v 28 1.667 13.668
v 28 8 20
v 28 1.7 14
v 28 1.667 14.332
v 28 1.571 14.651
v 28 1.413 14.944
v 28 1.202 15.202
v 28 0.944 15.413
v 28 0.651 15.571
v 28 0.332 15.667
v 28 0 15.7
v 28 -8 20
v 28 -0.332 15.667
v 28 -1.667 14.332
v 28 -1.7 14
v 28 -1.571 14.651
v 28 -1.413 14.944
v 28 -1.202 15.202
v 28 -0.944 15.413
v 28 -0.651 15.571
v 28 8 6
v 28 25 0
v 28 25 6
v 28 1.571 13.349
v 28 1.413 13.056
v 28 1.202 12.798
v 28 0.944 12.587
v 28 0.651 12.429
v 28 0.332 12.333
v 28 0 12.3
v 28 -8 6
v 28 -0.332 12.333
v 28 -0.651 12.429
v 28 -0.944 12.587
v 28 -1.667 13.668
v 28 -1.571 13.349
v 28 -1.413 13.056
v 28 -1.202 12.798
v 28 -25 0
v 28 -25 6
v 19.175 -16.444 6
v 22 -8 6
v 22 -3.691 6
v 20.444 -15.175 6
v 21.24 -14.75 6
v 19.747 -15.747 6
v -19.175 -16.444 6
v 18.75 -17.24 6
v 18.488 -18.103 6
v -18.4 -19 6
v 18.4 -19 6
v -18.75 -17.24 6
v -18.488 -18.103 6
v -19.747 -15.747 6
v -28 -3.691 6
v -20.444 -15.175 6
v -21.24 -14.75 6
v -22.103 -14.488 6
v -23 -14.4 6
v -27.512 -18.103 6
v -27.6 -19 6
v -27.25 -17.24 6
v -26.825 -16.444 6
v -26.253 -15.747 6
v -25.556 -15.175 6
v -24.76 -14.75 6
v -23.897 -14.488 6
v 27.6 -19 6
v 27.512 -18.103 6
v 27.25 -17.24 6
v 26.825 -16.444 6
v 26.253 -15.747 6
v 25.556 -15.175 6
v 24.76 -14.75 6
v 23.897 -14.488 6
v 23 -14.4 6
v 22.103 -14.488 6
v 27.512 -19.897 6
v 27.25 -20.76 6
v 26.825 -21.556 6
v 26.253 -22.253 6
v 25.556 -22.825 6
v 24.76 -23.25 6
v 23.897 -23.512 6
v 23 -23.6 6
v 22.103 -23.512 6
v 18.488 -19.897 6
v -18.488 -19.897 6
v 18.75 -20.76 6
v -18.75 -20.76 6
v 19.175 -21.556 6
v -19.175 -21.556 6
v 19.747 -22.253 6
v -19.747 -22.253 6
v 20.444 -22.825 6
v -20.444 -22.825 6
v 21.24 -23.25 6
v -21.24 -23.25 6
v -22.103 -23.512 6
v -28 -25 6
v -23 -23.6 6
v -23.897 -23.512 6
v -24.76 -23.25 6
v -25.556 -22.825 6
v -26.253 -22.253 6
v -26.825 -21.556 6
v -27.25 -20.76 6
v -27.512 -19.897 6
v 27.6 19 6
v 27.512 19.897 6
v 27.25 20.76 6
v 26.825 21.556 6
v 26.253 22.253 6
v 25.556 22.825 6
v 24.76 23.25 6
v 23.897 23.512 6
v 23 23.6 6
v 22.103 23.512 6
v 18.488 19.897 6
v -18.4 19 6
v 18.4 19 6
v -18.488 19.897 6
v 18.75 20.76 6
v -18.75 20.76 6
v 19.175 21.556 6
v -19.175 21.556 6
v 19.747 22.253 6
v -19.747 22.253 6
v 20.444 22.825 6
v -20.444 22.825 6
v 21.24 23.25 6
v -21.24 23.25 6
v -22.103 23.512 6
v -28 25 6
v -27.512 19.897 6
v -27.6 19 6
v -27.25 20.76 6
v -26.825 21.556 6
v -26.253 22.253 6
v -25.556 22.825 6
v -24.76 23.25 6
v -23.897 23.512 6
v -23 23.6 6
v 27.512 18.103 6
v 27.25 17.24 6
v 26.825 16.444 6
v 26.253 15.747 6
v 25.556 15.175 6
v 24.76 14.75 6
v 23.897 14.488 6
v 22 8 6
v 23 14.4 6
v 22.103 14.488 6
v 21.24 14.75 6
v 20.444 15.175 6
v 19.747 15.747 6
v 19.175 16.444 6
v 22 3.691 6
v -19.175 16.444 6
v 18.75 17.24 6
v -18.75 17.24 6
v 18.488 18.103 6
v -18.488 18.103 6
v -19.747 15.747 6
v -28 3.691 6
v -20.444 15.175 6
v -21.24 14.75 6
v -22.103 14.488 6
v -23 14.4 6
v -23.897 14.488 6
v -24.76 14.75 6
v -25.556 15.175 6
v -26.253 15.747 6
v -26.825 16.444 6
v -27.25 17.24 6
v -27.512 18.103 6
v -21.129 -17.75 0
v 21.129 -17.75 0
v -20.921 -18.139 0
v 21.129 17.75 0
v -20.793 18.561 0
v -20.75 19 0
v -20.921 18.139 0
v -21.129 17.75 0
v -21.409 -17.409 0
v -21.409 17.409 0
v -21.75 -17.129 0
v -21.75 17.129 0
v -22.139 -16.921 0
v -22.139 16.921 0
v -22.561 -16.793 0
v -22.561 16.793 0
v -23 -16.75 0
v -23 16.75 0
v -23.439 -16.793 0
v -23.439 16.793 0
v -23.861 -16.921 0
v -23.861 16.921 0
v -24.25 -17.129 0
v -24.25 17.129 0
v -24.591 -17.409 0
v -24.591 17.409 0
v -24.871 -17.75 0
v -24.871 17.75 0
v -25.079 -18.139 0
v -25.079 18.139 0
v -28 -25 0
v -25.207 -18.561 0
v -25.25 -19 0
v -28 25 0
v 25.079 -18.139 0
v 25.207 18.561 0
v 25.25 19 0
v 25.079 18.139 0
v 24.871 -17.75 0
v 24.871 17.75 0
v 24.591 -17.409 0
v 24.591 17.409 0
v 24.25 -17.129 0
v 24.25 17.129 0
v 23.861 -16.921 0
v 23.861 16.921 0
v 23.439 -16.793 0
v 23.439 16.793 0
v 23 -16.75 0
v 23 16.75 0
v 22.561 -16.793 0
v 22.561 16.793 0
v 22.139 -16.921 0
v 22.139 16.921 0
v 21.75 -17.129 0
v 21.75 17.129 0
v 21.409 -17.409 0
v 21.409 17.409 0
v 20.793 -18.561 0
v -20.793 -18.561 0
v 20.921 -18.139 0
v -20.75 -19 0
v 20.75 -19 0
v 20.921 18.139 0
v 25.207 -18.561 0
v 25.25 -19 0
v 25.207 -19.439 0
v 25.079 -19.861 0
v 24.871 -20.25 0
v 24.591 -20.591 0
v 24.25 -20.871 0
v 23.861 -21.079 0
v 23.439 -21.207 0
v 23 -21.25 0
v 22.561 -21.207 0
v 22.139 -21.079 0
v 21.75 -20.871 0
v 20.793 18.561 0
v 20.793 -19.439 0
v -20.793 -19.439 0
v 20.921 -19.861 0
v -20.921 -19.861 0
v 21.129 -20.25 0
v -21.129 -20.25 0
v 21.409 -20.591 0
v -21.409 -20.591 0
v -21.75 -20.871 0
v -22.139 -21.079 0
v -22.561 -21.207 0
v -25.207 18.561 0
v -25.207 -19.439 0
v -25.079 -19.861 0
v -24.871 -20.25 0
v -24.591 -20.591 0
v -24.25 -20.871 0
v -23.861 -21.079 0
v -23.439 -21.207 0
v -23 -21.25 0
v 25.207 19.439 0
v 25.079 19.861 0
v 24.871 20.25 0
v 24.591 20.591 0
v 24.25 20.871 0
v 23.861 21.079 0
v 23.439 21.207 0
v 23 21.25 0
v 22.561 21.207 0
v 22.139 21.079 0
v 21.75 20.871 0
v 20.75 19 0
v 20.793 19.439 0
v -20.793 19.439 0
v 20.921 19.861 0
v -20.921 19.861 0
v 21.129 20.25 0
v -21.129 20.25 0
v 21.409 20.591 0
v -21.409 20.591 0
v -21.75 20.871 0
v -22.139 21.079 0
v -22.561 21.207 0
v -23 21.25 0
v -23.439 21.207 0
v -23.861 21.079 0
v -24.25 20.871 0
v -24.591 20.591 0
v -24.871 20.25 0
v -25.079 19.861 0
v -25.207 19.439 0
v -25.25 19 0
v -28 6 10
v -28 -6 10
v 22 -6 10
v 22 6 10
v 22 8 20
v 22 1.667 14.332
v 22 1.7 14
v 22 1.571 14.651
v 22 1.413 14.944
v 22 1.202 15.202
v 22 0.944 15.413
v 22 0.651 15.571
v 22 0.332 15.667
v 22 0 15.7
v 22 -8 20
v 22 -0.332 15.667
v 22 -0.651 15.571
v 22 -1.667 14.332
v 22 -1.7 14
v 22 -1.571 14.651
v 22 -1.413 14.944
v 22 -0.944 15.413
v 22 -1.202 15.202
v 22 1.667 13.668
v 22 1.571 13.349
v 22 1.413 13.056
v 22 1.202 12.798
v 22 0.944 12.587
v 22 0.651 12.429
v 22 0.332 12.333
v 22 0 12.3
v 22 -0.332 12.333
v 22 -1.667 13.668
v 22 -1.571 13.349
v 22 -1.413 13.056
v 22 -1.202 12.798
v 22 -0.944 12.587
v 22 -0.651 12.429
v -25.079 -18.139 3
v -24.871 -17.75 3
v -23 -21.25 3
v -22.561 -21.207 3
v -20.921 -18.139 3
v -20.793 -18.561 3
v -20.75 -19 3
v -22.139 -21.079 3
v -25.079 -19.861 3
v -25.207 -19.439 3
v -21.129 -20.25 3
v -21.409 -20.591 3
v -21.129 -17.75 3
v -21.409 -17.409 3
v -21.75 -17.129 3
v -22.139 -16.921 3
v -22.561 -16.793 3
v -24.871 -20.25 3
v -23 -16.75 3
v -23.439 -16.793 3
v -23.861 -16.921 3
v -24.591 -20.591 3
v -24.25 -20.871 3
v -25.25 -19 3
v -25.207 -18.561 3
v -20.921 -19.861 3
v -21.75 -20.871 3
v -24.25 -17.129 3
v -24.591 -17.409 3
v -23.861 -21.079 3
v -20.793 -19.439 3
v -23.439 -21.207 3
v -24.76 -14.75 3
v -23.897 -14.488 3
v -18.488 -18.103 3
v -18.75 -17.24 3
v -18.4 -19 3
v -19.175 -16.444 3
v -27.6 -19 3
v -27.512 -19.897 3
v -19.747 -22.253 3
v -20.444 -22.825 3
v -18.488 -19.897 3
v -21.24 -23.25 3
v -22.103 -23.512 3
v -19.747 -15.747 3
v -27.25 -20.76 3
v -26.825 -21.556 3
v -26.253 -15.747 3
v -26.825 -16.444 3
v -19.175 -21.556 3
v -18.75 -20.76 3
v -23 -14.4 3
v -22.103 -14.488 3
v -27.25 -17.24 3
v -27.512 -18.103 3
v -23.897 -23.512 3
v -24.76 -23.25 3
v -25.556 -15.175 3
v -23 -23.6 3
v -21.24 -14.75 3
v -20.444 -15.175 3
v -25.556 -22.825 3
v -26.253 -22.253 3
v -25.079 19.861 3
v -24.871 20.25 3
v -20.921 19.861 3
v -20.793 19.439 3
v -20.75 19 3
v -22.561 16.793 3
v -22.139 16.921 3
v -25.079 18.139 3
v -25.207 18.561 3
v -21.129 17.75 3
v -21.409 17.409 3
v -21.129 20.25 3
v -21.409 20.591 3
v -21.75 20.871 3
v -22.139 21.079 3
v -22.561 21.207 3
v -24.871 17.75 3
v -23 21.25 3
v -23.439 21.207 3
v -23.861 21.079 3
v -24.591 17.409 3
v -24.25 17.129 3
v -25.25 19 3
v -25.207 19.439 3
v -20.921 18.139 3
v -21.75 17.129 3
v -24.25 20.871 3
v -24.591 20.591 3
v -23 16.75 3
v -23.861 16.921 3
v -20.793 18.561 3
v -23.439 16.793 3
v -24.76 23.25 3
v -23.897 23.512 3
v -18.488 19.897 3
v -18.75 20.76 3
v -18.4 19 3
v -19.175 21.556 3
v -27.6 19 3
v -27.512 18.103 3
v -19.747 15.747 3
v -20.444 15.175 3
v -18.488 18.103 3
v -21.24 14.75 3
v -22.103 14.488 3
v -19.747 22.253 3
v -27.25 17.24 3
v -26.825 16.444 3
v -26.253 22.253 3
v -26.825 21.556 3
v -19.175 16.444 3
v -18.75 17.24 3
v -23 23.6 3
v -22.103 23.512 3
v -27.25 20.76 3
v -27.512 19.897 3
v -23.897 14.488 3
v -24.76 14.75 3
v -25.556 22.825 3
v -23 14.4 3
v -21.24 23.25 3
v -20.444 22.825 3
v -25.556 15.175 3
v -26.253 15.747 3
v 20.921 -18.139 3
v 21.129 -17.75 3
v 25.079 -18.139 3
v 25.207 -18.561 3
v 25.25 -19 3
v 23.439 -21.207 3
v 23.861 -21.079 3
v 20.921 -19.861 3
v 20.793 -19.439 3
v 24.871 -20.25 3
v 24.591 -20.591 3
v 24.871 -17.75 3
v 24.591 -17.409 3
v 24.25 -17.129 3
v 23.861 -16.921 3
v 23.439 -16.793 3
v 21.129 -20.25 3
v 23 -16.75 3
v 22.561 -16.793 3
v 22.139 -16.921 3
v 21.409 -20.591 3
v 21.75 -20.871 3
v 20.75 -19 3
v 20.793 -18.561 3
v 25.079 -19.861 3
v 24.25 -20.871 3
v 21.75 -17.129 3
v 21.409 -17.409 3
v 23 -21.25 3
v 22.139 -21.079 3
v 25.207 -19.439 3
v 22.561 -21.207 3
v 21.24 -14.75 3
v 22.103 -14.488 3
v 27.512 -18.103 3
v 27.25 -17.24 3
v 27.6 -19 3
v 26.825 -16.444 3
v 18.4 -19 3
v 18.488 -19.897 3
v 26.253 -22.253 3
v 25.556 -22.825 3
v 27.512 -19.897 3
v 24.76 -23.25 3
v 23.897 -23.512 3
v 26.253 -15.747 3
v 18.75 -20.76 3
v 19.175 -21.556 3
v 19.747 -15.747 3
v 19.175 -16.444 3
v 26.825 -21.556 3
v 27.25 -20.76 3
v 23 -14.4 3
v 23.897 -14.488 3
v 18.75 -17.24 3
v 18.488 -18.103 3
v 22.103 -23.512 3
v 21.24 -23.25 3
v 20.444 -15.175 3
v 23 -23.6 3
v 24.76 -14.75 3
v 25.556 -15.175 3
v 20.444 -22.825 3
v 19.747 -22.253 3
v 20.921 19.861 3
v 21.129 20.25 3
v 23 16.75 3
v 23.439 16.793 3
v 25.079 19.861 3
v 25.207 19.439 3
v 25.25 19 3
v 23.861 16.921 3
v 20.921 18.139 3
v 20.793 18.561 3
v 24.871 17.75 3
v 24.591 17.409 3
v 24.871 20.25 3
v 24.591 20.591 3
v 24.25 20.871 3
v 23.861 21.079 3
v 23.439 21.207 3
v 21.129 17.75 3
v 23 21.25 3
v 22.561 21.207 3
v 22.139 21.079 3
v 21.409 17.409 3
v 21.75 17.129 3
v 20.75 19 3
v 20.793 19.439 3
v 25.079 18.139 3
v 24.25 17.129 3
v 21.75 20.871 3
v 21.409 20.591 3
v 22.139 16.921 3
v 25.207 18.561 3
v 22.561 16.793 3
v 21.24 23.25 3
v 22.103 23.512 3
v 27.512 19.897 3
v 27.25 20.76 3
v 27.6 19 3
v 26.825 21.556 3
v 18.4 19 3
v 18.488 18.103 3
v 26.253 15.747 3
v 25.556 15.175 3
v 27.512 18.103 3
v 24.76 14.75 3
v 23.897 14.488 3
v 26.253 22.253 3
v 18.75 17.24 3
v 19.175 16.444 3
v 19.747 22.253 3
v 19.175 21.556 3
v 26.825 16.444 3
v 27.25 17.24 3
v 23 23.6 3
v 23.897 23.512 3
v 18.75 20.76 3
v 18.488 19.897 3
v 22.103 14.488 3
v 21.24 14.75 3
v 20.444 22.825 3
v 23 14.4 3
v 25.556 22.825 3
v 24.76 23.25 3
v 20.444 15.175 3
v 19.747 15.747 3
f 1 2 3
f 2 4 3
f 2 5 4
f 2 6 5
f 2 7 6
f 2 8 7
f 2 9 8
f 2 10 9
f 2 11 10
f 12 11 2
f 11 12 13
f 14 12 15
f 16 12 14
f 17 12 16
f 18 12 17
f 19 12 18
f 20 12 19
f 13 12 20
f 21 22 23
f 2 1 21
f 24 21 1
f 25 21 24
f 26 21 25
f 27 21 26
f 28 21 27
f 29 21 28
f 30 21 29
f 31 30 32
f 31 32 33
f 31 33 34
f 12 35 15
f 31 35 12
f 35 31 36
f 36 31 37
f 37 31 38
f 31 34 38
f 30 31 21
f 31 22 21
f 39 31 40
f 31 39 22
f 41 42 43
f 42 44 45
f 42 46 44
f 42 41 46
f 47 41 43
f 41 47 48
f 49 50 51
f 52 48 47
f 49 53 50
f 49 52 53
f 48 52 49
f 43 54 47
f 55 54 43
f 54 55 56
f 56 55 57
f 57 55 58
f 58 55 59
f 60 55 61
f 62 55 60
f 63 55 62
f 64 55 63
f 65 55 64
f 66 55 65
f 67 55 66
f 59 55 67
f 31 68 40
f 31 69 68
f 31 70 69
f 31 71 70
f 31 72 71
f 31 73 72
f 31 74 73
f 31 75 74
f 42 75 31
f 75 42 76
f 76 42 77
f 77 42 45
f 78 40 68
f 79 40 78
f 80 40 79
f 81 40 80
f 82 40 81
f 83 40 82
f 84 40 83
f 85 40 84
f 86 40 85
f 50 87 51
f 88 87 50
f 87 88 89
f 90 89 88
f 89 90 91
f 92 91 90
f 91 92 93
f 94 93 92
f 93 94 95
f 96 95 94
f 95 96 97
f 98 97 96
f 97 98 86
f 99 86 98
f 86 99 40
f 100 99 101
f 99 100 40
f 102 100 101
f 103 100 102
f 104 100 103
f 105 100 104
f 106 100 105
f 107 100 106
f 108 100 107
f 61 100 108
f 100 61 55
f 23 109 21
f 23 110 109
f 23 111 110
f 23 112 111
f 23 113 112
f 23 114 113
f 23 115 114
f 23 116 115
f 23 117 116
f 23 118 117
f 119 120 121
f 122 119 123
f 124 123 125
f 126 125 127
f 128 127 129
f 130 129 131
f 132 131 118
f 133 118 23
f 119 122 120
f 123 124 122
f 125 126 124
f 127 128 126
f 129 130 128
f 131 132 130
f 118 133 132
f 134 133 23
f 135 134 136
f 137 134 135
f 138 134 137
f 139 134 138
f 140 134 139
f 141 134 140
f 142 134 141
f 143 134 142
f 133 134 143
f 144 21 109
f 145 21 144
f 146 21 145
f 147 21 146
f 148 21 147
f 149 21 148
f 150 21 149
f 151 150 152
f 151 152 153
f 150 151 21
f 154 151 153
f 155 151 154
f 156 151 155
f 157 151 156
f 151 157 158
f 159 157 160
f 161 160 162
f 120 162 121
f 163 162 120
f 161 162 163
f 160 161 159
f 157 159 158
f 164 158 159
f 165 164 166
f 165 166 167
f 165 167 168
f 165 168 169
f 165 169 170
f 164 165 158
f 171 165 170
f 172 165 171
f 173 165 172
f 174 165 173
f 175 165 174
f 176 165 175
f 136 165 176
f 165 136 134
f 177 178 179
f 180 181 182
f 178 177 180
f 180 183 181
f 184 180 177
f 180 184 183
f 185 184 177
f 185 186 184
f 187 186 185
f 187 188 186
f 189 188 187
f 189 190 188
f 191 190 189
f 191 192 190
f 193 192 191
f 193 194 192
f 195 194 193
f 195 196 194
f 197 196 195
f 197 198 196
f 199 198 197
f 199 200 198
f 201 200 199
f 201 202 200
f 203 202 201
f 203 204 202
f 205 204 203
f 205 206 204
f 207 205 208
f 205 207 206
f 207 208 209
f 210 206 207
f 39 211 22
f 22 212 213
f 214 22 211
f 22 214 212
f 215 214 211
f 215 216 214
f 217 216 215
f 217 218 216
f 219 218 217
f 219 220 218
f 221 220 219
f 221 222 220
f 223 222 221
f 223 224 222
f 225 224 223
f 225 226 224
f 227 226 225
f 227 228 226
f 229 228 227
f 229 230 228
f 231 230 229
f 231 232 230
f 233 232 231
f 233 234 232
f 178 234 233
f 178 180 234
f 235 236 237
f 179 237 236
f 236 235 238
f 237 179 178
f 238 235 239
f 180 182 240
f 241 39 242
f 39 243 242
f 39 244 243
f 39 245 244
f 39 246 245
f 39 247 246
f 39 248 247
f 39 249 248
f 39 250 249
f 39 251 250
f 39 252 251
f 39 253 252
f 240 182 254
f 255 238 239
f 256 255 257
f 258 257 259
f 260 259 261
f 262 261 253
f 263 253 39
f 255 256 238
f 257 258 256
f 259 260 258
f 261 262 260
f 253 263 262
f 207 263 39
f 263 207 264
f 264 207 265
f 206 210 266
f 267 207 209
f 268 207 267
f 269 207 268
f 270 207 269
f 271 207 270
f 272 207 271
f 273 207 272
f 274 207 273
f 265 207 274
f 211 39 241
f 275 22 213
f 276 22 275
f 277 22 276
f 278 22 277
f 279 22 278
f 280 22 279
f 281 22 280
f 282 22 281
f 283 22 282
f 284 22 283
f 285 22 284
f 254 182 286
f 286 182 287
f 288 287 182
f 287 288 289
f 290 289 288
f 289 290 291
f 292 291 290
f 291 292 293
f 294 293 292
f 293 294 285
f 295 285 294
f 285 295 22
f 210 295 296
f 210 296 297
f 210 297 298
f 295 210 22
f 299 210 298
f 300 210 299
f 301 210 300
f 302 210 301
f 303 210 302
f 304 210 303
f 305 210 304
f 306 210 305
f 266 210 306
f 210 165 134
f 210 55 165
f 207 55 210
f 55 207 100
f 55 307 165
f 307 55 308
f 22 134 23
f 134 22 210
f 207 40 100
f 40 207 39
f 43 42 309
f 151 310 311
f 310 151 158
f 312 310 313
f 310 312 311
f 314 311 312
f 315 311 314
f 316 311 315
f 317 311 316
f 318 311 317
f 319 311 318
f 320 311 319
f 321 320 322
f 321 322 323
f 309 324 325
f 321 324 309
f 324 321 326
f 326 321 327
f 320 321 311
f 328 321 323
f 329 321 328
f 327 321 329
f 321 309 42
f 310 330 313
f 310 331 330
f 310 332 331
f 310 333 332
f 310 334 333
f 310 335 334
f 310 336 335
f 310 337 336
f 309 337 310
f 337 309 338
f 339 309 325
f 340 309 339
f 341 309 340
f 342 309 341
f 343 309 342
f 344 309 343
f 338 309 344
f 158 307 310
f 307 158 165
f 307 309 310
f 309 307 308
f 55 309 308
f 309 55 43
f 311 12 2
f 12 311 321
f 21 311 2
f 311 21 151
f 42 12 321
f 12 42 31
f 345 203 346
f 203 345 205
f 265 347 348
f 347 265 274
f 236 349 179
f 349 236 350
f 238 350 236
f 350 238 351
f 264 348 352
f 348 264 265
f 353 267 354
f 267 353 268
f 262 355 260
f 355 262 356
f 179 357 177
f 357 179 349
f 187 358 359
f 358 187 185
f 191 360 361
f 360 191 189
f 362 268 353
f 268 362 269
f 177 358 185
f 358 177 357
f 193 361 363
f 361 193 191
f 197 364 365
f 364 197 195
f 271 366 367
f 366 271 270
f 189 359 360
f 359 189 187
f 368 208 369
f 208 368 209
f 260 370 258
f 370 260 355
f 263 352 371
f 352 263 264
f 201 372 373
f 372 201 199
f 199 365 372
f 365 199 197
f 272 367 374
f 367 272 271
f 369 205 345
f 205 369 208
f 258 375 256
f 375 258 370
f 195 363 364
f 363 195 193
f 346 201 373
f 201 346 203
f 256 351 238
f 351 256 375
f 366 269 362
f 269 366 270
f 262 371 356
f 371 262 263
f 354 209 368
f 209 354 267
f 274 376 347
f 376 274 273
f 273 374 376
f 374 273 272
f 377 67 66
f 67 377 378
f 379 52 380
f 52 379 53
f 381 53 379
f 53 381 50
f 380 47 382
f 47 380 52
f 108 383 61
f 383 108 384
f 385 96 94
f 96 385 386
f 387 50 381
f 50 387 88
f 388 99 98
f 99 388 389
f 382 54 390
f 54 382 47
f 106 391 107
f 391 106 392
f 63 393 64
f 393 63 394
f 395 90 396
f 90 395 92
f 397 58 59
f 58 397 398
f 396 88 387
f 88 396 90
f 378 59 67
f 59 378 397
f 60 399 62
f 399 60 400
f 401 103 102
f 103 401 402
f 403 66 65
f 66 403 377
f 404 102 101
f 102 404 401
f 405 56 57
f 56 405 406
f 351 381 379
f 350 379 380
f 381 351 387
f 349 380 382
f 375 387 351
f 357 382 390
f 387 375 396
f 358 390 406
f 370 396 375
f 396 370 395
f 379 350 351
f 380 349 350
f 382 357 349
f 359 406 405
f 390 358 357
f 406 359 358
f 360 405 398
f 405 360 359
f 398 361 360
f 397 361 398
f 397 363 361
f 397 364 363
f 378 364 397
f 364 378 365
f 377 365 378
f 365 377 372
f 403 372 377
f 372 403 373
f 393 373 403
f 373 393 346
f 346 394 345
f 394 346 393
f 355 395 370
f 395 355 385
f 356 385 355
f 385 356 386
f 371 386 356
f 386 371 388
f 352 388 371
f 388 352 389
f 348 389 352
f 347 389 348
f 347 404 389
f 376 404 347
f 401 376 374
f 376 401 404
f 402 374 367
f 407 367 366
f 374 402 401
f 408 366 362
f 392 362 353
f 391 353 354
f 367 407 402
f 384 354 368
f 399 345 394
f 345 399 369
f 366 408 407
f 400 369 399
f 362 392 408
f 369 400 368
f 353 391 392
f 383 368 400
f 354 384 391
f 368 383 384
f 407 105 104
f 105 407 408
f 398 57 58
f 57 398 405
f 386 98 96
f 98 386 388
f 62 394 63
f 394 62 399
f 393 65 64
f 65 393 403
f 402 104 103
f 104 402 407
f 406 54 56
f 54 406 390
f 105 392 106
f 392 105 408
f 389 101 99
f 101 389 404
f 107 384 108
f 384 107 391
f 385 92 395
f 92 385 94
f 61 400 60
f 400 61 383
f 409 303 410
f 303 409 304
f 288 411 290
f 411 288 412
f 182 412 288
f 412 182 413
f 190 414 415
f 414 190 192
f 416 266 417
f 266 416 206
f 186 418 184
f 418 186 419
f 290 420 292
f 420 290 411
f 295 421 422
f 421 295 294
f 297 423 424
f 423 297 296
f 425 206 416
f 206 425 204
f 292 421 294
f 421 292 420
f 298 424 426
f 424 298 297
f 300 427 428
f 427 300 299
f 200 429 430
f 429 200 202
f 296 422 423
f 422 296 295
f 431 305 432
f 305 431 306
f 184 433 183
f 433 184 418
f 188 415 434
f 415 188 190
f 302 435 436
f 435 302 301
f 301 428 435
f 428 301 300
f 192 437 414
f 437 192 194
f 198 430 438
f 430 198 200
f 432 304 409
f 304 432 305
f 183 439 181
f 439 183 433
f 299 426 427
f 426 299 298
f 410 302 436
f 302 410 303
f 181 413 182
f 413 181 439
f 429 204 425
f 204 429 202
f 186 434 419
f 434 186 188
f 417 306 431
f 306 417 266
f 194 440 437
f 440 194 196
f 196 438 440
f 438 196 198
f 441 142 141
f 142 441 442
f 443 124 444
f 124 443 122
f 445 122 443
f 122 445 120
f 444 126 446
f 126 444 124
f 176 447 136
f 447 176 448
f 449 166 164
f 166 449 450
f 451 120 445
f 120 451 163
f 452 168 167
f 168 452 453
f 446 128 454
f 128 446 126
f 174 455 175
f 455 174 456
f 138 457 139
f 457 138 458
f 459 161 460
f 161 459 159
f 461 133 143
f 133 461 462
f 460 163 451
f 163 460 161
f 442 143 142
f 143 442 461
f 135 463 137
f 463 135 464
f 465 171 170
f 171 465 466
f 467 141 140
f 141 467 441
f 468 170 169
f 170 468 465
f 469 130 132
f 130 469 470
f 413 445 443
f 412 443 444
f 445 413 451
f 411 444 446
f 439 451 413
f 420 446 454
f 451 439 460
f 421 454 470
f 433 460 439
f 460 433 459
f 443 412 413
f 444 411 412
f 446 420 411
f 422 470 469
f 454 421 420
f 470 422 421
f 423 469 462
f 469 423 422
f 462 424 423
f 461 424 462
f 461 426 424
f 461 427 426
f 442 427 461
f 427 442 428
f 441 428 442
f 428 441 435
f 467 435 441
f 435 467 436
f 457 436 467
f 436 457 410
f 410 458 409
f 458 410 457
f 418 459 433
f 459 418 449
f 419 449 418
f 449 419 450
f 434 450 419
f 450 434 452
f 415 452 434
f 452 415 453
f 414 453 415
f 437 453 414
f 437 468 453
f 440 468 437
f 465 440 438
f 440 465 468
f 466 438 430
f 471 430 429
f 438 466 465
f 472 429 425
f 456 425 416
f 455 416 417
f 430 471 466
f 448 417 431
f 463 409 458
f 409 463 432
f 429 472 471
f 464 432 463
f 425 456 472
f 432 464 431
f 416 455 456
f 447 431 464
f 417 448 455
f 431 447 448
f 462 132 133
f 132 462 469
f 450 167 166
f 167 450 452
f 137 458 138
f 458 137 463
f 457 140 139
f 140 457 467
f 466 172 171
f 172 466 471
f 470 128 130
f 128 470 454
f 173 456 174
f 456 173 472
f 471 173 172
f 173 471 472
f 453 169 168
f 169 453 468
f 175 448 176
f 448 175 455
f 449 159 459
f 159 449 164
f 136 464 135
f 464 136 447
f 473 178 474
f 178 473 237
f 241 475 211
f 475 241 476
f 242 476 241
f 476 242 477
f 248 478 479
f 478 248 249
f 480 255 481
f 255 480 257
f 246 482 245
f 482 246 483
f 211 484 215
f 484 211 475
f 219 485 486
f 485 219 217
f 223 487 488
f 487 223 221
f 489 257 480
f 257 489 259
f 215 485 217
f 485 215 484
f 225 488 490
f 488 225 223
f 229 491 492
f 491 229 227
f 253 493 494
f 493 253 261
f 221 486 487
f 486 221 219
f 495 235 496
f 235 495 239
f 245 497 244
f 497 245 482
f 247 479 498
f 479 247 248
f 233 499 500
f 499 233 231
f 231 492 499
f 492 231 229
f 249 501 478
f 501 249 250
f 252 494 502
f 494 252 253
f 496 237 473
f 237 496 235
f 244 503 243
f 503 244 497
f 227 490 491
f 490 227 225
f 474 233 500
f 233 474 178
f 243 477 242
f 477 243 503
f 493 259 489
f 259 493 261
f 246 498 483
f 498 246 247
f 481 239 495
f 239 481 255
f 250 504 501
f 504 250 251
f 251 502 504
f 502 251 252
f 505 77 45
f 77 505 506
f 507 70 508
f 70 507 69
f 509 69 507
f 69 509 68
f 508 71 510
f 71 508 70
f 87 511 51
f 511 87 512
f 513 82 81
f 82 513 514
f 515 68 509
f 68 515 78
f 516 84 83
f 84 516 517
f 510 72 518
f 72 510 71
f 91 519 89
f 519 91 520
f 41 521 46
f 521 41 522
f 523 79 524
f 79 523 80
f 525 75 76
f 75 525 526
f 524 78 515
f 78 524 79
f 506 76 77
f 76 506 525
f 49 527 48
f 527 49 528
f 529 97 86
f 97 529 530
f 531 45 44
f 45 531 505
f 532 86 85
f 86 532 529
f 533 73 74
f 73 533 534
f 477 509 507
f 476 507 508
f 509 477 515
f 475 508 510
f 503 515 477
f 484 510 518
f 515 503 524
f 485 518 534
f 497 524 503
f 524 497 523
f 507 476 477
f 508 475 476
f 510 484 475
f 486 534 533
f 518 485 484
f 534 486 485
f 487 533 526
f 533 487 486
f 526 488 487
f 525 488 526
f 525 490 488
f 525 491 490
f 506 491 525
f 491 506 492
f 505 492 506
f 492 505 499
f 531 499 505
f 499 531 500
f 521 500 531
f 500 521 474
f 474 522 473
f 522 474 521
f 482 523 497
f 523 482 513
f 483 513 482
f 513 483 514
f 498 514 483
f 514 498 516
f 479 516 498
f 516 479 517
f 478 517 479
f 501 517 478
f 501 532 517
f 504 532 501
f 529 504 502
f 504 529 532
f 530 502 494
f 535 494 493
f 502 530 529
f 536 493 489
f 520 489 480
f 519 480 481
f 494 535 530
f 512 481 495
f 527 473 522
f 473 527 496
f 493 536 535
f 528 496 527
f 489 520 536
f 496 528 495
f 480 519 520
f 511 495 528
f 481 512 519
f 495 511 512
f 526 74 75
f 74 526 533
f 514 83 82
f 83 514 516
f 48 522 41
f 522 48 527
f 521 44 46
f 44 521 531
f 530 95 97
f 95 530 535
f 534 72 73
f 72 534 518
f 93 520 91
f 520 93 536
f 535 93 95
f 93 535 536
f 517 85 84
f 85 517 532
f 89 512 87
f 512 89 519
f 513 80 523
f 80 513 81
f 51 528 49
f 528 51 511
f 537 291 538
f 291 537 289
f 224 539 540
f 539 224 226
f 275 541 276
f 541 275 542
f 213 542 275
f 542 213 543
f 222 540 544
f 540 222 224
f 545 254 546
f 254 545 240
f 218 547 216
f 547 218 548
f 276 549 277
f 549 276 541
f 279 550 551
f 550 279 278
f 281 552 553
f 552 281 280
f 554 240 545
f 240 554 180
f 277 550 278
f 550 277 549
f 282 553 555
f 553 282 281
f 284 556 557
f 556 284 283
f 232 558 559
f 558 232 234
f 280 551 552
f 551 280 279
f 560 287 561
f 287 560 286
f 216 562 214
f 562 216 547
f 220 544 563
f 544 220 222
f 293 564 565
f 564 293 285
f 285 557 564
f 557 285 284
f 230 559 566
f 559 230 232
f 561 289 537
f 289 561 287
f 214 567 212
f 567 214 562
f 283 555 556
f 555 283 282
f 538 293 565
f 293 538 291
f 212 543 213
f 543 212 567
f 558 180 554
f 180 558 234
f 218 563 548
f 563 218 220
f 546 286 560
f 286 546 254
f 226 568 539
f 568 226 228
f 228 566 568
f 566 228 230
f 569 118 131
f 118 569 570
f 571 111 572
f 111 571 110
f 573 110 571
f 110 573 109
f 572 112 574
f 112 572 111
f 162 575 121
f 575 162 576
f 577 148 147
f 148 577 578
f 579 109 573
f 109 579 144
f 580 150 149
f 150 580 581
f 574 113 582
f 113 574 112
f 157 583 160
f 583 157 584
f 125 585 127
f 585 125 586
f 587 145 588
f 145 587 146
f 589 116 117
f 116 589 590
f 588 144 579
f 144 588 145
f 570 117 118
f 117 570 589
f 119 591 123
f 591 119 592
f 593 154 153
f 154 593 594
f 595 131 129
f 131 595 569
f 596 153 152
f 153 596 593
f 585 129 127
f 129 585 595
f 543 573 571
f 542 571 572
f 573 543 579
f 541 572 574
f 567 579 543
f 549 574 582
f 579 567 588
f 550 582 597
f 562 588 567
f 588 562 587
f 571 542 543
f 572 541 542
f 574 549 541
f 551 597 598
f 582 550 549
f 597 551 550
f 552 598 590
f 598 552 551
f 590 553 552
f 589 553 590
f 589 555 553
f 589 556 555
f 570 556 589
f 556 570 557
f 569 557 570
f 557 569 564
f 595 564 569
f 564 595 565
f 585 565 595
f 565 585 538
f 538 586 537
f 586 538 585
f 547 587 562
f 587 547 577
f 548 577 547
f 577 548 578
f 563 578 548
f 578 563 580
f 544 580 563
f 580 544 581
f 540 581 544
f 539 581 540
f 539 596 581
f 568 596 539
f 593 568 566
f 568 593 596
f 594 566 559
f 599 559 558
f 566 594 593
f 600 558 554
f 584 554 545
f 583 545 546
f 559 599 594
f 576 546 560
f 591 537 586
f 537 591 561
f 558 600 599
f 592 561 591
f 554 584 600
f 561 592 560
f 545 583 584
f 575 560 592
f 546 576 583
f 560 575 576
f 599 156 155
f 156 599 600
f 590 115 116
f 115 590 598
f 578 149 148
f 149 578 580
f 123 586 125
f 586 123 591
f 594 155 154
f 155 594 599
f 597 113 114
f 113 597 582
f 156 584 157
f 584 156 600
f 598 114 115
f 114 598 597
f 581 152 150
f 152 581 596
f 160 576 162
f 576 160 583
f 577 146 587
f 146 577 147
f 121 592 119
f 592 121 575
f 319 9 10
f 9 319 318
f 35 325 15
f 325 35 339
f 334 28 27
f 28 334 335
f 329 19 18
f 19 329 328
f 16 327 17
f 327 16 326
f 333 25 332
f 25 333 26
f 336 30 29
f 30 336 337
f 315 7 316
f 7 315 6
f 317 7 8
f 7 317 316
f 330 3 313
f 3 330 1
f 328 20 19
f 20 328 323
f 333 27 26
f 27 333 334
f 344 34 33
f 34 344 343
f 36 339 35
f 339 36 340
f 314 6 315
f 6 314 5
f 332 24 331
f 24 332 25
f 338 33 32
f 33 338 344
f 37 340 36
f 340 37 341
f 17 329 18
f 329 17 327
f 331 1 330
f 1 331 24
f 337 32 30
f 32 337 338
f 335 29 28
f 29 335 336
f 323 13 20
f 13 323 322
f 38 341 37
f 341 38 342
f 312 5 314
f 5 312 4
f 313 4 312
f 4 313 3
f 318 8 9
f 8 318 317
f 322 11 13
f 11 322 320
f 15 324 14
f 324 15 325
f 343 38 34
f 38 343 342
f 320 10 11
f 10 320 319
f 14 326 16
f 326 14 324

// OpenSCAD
// file: ../stage.scad
// ============================================================
//  Positioning stage: base (X dovetail) -> x-slider with column
//  (Z dovetail) -> z-slider (payload face toward +Y) + column cap.
//  Every axis: M3 adjust screw captured in the fixed part by head +
//  nylock, threading into a captive nut in the moving part
//  (0.5 mm/turn, both directions), plus an M3 lock screw.
//  Modules model parts in stage-local coordinates at mid travel.
// ============================================================
include <lib.scad>

// Dovetail standing on the column's +Y face, running along Z.
// multmatrix maps (x,y,z) -> (y,z,x): run->Z, width->X, height->Y.
module zrail_frame() { multmatrix([[0,1,0,0],[0,0,1,0],[1,0,0,0]]) children(); }

module stage_base() {
    rail_x0 = -stage_L / 2;
    rail_len = stage_L - stage_tab_t;
    tab_h = stage_base_h + xs_screw_z + 6;
    difference() {
        union() {
            translate([-stage_L / 2, -stage_D / 2, 0]) cube([stage_L, stage_D, stage_base_h]);
            translate([rail_x0, 0, stage_base_h]) dovetail_rail(rail_len);
            // adjust-screw tab
            translate([stage_L / 2 - stage_tab_t, -8, 0]) cube([stage_tab_t, 16, tab_h]);
        }
        wood_screw_holes(stage_mount_pts, stage_base_h, cbore = 3);
        // X adjust screw through tab (head outside, nylock inside)
        translate([stage_L / 2 - stage_tab_t - 1, 0, stage_base_h + xs_screw_z])
            rotate([0, 90, 0]) screw_hole(m3_d, stage_tab_t + 2);
    }
}

// Upper stack shares the x-slider's X offset.
module stage_x_slider() {
    x0 = xs_xc - xs_len / 2;
    difference() {
        union() {
            translate([x0, -xs_w / 2, stage_base_h]) cube([xs_len, xs_w, xs_h]);
            // column
            translate([xs_xc - col_w / 2, col_y0, xs_top - 0.01]) cube([col_w, col_t, col_h + 0.01]);
            translate([xs_xc, col_y1, xs_top]) zrail_frame() dovetail_rail(col_h);
        }
        translate([x0 - 1, 0, stage_base_h]) dovetail_slot(xs_len + 2);
        // X adjust: screw enters +X face, nut dropped in from the top
        translate([x0 + xs_len + 0.01, 0, stage_base_h + xs_screw_z]) rotate([0, -90, 0])
            screw_hole(m3_d, xs_adj_hole);
        translate([x0 + xs_len - 6 - m3_nut_t / 2, -(m3_nut_af + clr) / 2, stage_base_h + xs_screw_z - 3.5])
            cube([m3_nut_t + 0.4, m3_nut_af + clr, xs_h]);
        // X lock: horizontal from +Y face onto rail flank, nut from top
        translate([xs_xc + 8, xs_w / 2 + 0.01, stage_base_h + 2.5]) rotate([90, 0, 0])
            screw_hole(m3_d, xs_w / 2 - 3);
        translate([xs_xc + 8 - (m3_nut_af + clr) / 2, 9 - (m3_nut_t + 0.4) / 2, stage_base_h + 2.5 - 3.3])
            cube([m3_nut_af + clr, m3_nut_t + 0.4, xs_h]);
        // cap screws (tapped into column top)
        for (sx = [-8, 8]) translate([xs_xc + sx, col_y0 + 5, col_top - 10])
            screw_hole(m3_tap, 10.1);
    }
}

module stage_z_slider() {
    y0 = col_y1;
    x0 = xs_xc - zs_w / 2;
    difference() {
        translate([x0, y0, zs_z0]) cube([zs_w, zs_t, zs_h]);
        translate([xs_xc, col_y1, zs_z0 - 1]) zrail_frame() dovetail_slot(zs_h + 2);
        // payload holes + nut slots from the bottom
        for (p = payload_pts) {
            translate([xs_xc + p[0], payload_face_y + 0.01, stage_payload_z + p[1]])
                rotate([90, 0, 0]) screw_hole(m3_d, 7.5);
            translate([xs_xc + p[0] - (m3_nut_af + clr) / 2, payload_face_y - 4 - (m3_nut_t + 0.4) / 2, zs_z0 - 1])
                cube([m3_nut_af + clr, m3_nut_t + 0.4, zs_h / 2 + 1 + 3.3]);
        }
        // Z adjust: through hole, nut slot from the -X side 5 below the top
        translate([xs_xc + zs_screw_x, zs_screw_y, zs_z0 + zs_h - zs_adj_hole]) screw_hole(m3_d, zs_adj_hole + 0.1);
        translate([x0 - 1, zs_screw_y - (m3_nut_af + clr) / 2, zs_z0 + zs_h - 5 - (m3_nut_t + 0.4) / 2])
            cube([zs_screw_x + zs_w / 2 + 1 + (m3_nut_af + clr) / 2, m3_nut_af + clr, m3_nut_t + 0.4]);
        // Z lock: from the +X (outward) side onto the rail flank, nut dropped in from the top
        lz = zs_z0 + zs_h - 5;
        x1 = x0 + zs_w;
        translate([x1 + 0.01, col_y1 + 2, lz]) rotate([0, -90, 0]) screw_hole(m3_d, zs_w / 2 - 4);
        translate([x1 - 2.5 - (m3_nut_t + 0.4), col_y1 + 2 - zl_pocket_w / 2, lz - (m3_nut_af + clr) / 2 / cos(30)])
            cube([m3_nut_t + 0.4, zl_pocket_w, zs_h]);
    }
}

module stage_z_cap() {
    difference() {
        // stops 1 mm short of the payload face so the payload never rubs it
        translate([xs_xc - col_w / 2, col_y0, col_top]) cube([col_w, payload_face_y - col_y0 - 1, cap_t]);
        for (sx = [-8, 8]) translate([xs_xc + sx, col_y0 + 5, col_top]) screw_hole(m3_d, cap_t);
        translate([xs_xc + zs_screw_x, zs_screw_y, col_top]) screw_hole(m3_d, cap_t);
    }
}

// ---- placed at a fine-travel offset (dx, dz) ----
module stage_x_slider_placed(dx = 0) { translate([dx, 0, 0]) stage_x_slider(); }
module stage_z_cap_placed(dx = 0)    { translate([dx, 0, 0]) stage_z_cap(); }
module stage_z_slider_placed(dx = 0, dz = 0) { translate([dx, 0, dz]) stage_z_slider(); }

// Children placed at the payload face centre (origin on the face, +Y out).
module stage_payload_origin(dx = 0, dz = 0) {
    translate([xs_xc + dx, payload_face_y, stage_payload_z + dz]) children();
}

// Optional mirror (tower B) wraps the stage-local geometry.
module stage_hand(mir) { if (mir) mirror([1, 0, 0]) children(); else children(); }

module stage_assembly(dx = 0, dz = 0) {
    color("SteelBlue") stage_base();
    color("LightSteelBlue") stage_x_slider_placed(dx);
    color("SkyBlue") stage_z_cap_placed(dx);
    color("CadetBlue") stage_z_slider_placed(dx, dz);
}

// ---- travel checks ----
_right_gap = (stage_L / 2 - stage_tab_t) - (xs_xc + xs_len / 2) - locknut_t;
_left_ok   = 10;   // slider may overhang the rail start by up to 10 mm
echo("CHECK", "stage_travel_x", 2 * min(_right_gap, _left_ok));
// adjust screws: head on the fixed tab/cap, tip must pass the moving nut
// at the far travel end and stay inside the hole at the near end
_xnut = xs_xc + xs_len / 2 - 6;                  // nut centre X at mid
_xtip = stage_L / 2 - x_adj_len;
echo("CHECK", "x_adj_engage", (_xnut - stage_travel - (m3_nut_t + 0.4) / 2) - _xtip);
echo("CHECK", "x_adj_hole", _xtip - (xs_xc + xs_len / 2 + stage_travel - xs_adj_hole));
_znut = zs_z0 + zs_h - 5;
_ztip = stage_top_z - z_adj_len;
echo("CHECK", "z_adj_engage", (_znut - stage_travel - (m3_nut_t + 0.4) / 2) - _ztip);
echo("CHECK", "z_adj_hole", _ztip - (zs_z0 + zs_h + stage_travel - zs_adj_hole));
echo("CHECK", "z_lock_pocket_w", zl_pocket_w);
echo("CHECK", "stage_travel_z", 2 * min(stage_gap_z, cap_gap - locknut_t));
// main file
// Positioning stage base. Print as shown. Qty 3 (one with mirrored = true, for port tower B).
include <../stage.scad>
/* [Options] */
// true for port tower B (mirror image, X adjust screw faces outward)
mirrored = false;

stage_hand(mirrored) stage_base();
